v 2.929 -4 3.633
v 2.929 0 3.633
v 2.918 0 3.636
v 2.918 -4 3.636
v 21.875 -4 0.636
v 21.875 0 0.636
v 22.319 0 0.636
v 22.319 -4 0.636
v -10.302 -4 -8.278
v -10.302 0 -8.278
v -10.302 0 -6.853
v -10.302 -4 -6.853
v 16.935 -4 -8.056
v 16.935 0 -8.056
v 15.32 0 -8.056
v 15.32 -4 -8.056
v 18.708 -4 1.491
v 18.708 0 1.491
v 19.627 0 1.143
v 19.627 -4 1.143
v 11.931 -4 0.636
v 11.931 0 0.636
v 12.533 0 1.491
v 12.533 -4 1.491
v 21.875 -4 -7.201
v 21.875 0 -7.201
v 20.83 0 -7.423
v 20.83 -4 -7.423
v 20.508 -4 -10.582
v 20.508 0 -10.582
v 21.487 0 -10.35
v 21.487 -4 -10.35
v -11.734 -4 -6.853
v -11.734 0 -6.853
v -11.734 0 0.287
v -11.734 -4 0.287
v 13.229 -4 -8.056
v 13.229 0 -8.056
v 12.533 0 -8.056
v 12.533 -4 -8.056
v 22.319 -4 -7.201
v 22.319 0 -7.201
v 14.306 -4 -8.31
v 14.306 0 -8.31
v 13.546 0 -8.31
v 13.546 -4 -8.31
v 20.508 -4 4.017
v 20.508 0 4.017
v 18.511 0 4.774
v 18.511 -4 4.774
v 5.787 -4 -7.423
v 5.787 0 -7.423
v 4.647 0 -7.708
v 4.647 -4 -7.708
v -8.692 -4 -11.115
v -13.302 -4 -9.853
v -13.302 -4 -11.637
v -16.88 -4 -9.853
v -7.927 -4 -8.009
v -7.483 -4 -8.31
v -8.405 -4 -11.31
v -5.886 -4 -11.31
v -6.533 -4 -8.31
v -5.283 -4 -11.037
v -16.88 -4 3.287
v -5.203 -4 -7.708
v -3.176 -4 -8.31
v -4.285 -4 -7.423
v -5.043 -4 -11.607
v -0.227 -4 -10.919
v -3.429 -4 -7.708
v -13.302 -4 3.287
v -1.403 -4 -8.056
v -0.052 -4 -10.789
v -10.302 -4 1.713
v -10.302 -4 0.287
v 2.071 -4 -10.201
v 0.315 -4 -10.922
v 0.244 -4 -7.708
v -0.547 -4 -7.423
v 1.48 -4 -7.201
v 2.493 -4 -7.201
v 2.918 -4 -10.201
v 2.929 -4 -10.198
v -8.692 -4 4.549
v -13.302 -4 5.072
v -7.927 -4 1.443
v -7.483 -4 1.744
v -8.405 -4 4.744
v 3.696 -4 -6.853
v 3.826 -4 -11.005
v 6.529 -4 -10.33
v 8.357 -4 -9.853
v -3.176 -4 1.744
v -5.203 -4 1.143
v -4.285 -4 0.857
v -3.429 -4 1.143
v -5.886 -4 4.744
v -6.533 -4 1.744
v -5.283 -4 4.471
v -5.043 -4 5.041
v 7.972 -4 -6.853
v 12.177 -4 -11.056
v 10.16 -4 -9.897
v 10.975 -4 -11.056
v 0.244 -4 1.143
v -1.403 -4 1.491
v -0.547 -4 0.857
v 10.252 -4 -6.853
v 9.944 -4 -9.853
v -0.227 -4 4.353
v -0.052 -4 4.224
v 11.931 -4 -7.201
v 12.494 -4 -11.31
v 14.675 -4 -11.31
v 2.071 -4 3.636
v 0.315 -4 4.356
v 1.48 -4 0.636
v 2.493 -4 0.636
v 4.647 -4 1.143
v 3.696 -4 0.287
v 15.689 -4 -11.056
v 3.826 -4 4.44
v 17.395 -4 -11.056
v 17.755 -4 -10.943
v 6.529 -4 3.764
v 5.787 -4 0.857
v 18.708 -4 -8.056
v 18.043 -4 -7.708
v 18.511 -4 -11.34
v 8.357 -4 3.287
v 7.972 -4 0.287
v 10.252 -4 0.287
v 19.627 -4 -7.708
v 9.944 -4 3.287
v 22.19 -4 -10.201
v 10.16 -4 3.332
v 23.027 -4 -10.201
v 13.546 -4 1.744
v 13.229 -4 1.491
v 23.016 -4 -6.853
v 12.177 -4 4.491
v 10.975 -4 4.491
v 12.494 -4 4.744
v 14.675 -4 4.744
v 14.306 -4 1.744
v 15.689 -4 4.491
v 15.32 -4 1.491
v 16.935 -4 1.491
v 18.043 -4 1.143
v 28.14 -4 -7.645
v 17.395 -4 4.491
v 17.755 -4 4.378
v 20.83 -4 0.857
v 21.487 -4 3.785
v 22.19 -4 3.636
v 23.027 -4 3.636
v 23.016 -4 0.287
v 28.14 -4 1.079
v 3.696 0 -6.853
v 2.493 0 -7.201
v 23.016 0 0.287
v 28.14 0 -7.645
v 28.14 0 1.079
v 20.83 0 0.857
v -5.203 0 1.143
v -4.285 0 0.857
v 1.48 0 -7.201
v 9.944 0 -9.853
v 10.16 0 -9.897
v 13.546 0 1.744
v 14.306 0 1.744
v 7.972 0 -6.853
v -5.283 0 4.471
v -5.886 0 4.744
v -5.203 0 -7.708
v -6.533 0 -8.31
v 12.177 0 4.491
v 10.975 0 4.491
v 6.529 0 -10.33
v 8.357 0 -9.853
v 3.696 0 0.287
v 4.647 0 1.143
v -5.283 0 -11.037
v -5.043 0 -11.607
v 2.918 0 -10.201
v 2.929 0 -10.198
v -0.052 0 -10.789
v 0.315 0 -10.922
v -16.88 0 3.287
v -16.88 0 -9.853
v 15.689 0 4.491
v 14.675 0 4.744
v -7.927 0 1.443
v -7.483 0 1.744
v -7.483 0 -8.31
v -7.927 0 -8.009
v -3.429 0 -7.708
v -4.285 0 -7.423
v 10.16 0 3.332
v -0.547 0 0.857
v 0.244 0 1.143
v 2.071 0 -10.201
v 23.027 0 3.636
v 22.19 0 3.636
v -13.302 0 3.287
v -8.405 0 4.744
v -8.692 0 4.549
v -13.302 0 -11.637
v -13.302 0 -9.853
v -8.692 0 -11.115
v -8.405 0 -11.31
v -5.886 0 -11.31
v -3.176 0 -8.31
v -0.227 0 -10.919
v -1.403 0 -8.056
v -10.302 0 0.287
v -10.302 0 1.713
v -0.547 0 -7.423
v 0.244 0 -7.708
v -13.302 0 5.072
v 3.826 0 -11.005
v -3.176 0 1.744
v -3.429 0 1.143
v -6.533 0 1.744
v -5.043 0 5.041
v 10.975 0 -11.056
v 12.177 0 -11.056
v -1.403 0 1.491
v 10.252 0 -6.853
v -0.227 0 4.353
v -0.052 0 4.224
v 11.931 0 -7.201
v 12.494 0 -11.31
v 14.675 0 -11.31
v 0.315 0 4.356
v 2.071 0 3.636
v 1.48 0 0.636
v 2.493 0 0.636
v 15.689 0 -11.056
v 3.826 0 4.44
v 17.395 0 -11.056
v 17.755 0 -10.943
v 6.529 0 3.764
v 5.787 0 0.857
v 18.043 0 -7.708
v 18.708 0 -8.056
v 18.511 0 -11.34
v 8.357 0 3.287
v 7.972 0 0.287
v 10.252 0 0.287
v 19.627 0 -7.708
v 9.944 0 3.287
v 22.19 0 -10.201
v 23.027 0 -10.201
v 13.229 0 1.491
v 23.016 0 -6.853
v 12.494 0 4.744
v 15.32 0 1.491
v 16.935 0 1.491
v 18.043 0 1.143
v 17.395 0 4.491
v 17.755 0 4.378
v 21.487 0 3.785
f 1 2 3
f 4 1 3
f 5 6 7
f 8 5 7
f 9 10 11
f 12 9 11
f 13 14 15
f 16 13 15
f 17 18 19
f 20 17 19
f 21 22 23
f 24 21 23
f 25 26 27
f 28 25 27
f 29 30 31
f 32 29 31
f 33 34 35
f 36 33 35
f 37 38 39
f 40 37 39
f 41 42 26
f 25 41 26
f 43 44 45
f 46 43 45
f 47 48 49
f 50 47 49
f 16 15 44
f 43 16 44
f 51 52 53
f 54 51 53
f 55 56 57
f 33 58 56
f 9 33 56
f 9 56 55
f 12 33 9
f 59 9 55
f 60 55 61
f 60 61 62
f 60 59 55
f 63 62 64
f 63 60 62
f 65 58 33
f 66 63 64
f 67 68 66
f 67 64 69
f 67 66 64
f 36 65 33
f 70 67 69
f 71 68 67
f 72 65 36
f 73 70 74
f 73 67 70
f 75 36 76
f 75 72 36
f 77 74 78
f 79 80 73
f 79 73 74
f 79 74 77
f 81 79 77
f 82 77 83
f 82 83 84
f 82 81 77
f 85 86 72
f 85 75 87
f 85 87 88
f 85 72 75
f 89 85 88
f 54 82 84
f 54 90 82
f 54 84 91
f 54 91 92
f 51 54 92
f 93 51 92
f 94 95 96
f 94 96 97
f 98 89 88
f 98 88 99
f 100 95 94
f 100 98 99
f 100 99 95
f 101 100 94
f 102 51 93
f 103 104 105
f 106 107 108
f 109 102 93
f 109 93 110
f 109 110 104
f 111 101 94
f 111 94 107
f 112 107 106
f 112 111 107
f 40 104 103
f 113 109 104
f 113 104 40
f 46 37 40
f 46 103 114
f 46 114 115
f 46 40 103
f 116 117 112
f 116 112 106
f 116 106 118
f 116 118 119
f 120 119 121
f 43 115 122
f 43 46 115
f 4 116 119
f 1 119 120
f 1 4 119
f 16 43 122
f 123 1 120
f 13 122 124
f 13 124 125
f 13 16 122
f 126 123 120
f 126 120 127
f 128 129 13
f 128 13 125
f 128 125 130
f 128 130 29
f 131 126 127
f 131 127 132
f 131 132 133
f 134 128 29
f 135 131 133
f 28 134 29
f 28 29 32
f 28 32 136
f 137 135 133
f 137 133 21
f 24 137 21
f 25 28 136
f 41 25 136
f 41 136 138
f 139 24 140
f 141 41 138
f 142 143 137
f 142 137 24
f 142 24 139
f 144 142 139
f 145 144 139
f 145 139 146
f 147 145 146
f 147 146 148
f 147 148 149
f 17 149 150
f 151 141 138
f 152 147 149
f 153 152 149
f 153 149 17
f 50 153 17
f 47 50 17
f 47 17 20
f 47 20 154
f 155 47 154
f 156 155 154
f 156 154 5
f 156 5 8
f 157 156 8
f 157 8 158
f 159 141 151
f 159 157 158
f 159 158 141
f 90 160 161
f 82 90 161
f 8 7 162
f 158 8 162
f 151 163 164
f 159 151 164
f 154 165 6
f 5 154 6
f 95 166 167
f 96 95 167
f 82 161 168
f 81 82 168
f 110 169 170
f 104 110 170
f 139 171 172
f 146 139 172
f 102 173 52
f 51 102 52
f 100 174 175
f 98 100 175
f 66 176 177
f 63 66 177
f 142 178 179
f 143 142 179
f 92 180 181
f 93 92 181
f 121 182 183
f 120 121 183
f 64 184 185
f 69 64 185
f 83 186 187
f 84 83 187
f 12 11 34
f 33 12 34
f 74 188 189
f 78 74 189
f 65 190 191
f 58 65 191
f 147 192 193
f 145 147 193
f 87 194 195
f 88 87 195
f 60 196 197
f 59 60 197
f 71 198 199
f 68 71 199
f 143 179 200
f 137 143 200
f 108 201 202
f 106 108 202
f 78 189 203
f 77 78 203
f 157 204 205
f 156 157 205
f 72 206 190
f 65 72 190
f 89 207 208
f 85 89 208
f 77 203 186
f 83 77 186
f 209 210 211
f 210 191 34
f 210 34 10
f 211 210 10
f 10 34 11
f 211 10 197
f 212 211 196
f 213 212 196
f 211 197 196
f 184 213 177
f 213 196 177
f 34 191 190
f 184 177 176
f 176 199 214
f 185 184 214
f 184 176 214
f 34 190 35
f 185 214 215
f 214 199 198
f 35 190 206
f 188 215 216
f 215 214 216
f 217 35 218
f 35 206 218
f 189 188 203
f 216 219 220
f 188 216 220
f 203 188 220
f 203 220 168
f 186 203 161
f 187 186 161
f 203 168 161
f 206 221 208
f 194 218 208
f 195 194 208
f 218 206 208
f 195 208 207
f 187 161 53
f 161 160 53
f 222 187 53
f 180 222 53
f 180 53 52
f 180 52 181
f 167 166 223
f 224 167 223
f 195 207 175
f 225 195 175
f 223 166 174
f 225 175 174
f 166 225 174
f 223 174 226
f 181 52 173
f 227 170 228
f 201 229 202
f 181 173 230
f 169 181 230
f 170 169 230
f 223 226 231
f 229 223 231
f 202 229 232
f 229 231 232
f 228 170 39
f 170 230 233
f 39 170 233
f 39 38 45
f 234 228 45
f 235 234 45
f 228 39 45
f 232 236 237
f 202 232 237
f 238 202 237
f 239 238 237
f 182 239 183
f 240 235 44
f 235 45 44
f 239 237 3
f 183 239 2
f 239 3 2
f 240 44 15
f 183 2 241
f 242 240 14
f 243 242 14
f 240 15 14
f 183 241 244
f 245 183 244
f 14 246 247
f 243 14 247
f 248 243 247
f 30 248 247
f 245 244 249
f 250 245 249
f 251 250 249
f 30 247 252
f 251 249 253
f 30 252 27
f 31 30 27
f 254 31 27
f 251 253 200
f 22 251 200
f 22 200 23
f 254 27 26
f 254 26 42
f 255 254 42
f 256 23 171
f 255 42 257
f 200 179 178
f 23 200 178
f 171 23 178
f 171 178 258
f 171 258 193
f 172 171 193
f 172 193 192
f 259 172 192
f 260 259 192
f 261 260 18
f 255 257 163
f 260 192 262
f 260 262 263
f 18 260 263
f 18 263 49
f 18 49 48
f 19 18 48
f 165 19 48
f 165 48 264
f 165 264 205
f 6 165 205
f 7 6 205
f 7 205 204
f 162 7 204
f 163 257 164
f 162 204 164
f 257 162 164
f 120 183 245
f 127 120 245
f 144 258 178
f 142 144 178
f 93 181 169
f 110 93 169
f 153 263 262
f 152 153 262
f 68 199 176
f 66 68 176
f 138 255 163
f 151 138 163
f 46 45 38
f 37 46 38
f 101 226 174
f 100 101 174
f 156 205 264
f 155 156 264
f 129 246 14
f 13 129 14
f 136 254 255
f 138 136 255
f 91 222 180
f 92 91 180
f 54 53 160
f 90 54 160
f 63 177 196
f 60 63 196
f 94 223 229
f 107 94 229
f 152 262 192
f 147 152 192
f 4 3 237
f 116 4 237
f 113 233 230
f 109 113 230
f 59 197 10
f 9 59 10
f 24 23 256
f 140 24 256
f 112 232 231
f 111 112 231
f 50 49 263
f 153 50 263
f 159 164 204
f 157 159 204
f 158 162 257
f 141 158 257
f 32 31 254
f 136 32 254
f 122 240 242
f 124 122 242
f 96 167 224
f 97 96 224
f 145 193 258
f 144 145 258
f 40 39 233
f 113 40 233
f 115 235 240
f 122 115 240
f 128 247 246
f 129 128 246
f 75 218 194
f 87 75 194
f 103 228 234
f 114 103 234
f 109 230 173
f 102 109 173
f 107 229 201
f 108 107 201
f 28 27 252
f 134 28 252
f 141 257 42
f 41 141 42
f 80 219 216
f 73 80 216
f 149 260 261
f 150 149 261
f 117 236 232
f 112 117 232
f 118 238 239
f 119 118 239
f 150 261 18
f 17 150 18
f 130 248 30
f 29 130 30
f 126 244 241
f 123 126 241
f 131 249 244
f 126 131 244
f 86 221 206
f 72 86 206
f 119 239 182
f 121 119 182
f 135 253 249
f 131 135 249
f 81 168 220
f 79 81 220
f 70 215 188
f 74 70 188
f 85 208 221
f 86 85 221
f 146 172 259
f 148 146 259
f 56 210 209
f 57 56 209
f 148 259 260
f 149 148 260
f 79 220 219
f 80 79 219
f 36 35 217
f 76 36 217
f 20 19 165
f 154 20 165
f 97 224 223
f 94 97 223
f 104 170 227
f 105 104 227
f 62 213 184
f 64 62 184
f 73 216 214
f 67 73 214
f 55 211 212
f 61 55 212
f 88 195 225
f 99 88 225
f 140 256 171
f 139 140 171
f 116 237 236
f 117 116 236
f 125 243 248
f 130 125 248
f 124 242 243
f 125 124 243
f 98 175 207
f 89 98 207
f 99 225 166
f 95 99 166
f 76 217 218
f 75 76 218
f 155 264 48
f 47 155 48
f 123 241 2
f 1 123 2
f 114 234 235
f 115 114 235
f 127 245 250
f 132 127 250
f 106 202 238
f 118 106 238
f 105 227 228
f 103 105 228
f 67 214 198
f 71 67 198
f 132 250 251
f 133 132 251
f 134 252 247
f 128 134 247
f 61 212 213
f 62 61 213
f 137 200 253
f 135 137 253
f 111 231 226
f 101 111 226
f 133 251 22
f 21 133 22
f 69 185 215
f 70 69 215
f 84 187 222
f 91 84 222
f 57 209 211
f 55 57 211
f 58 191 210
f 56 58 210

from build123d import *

# Parameters (mm, degrees)
F1_DEPTH = 4


with BuildPart() as f1:
    # F0 (on Front) → F1 (new body)
    with BuildSketch(Plane.XZ):
        Polygon((28.140141, 1.079267), (23.027079, 3.635797), (22.190165, 3.635797), (21.487397, 3.784869), (20.508261, 4.01677), (18.511227, 4.774267), (17.754608, 4.377944), (17.395179, 4.490907), (15.688958, 4.490907), (14.675495, 4.744273), (12.493739, 4.744273), (12.177031, 4.490907), (10.975377, 4.490907), (10.159982, 3.332186), (9.944286, 3.287419), (9.713922, 3.287419), (8.356896, 3.287419), (6.529206, 3.764208), (3.825945, 4.440023), (2.928981, 3.632755), (2.91847, 3.635797), (2.070995, 3.635797), (0.314703, 4.356327), (-0.052348, 4.224189), (-0.22679, 4.353405), (-5.04288, 5.041418), (-5.2829, 4.471371), (-5.886157, 4.744273), (-8.405054, 4.744273), (-8.692273, 4.549374), (-13.301984, 5.071807), (-13.301984, 3.287419), (-16.88024, 3.287419), (-16.88024, -0.282654), (-16.88024, -6.282654), (-16.88024, -9.852727), (-13.301984, -9.852727), (-13.301984, -11.637115), (-8.692273, -11.114682), (-8.405054, -11.309581), (-5.886157, -11.309581), (-5.2829, -11.036679), (-5.04288, -11.606726), (-0.22679, -10.918713), (-0.052348, -10.789497), (0.314703, -10.921635), (2.070995, -10.201105), (2.91847, -10.201105), (2.928981, -10.198063), (3.825945, -11.005331), (6.529206, -10.329516), (8.356896, -9.852727), (9.713922, -9.852727), (9.944286, -9.852727), (10.159982, -9.897494), (10.975377, -11.056215), (12.177031, -11.056215), (12.493739, -11.309581), (14.675495, -11.309581), (15.688958, -11.056215), (17.395179, -11.056215), (17.754608, -10.943252), (18.511227, -11.339575), (20.508261, -10.582078), (21.487397, -10.350178), (22.190165, -10.201105), (23.027079, -10.201105), (28.140141, -7.644575), align=None)
        Polygon((-11.733841, -6.852727), (-11.733841, 0.287419), (-10.301984, 0.287419), (-10.301984, 1.712602), (-7.926678, 1.443401), (-7.483288, 1.744273), (-6.533165, 1.744273), (-5.202995, 1.142529), (-4.284543, 0.857492), (-3.429434, 1.142529), (-3.176068, 1.744273), (-1.402506, 1.490907), (-0.547397, 0.857492), (0.244372, 1.142529), (1.479531, 0.635797), (2.492994, 0.635797), (3.696482, 0.287419), (4.646604, 1.142529), (5.786751, 0.857492), (7.972032, 0.287419), (9.713922, 0.287419), (10.252325, 0.287419), (11.930874, 0.635797), (12.532617, 1.490907), (13.229374, 1.490907), (13.546081, 1.744273), (14.306178, 1.744273), (15.319642, 1.490907), (16.934849, 1.490907), (18.043324, 1.142529), (18.708412, 1.490907), (19.626861, 1.142529), (20.83035, 0.857492), (21.875484, 0.635797), (22.318875, 0.635797), (23.015631, 0.287419), (23.015631, -6.852727), (22.318875, -7.201105), (21.875484, -7.201105), (20.83035, -7.422801), (19.626861, -7.707837), (18.708412, -8.056215), (18.043324, -7.707837), (16.934849, -8.056215), (15.319642, -8.056215), (14.306178, -8.309581), (13.546081, -8.309581), (13.229374, -8.056215), (12.532617, -8.056215), (11.930874, -7.201105), (10.252325, -6.852727), (9.713922, -6.852727), (7.972032, -6.852727), (5.786751, -7.422801), (4.646604, -7.707837), (3.696482, -6.852727), (2.492994, -7.201105), (1.479531, -7.201105), (0.244372, -7.707837), (-0.547397, -7.422801), (-1.402506, -8.056215), (-3.176068, -8.309581), (-3.429434, -7.707837), (-4.284543, -7.422801), (-5.202995, -7.707837), (-6.533165, -8.309581), (-7.483288, -8.309581), (-7.926678, -8.008709), (-10.301984, -8.27791), (-10.301984, -6.852727), align=None, mode=Mode.SUBTRACT)
    extrude(amount=F1_DEPTH)


solid = f1.part
